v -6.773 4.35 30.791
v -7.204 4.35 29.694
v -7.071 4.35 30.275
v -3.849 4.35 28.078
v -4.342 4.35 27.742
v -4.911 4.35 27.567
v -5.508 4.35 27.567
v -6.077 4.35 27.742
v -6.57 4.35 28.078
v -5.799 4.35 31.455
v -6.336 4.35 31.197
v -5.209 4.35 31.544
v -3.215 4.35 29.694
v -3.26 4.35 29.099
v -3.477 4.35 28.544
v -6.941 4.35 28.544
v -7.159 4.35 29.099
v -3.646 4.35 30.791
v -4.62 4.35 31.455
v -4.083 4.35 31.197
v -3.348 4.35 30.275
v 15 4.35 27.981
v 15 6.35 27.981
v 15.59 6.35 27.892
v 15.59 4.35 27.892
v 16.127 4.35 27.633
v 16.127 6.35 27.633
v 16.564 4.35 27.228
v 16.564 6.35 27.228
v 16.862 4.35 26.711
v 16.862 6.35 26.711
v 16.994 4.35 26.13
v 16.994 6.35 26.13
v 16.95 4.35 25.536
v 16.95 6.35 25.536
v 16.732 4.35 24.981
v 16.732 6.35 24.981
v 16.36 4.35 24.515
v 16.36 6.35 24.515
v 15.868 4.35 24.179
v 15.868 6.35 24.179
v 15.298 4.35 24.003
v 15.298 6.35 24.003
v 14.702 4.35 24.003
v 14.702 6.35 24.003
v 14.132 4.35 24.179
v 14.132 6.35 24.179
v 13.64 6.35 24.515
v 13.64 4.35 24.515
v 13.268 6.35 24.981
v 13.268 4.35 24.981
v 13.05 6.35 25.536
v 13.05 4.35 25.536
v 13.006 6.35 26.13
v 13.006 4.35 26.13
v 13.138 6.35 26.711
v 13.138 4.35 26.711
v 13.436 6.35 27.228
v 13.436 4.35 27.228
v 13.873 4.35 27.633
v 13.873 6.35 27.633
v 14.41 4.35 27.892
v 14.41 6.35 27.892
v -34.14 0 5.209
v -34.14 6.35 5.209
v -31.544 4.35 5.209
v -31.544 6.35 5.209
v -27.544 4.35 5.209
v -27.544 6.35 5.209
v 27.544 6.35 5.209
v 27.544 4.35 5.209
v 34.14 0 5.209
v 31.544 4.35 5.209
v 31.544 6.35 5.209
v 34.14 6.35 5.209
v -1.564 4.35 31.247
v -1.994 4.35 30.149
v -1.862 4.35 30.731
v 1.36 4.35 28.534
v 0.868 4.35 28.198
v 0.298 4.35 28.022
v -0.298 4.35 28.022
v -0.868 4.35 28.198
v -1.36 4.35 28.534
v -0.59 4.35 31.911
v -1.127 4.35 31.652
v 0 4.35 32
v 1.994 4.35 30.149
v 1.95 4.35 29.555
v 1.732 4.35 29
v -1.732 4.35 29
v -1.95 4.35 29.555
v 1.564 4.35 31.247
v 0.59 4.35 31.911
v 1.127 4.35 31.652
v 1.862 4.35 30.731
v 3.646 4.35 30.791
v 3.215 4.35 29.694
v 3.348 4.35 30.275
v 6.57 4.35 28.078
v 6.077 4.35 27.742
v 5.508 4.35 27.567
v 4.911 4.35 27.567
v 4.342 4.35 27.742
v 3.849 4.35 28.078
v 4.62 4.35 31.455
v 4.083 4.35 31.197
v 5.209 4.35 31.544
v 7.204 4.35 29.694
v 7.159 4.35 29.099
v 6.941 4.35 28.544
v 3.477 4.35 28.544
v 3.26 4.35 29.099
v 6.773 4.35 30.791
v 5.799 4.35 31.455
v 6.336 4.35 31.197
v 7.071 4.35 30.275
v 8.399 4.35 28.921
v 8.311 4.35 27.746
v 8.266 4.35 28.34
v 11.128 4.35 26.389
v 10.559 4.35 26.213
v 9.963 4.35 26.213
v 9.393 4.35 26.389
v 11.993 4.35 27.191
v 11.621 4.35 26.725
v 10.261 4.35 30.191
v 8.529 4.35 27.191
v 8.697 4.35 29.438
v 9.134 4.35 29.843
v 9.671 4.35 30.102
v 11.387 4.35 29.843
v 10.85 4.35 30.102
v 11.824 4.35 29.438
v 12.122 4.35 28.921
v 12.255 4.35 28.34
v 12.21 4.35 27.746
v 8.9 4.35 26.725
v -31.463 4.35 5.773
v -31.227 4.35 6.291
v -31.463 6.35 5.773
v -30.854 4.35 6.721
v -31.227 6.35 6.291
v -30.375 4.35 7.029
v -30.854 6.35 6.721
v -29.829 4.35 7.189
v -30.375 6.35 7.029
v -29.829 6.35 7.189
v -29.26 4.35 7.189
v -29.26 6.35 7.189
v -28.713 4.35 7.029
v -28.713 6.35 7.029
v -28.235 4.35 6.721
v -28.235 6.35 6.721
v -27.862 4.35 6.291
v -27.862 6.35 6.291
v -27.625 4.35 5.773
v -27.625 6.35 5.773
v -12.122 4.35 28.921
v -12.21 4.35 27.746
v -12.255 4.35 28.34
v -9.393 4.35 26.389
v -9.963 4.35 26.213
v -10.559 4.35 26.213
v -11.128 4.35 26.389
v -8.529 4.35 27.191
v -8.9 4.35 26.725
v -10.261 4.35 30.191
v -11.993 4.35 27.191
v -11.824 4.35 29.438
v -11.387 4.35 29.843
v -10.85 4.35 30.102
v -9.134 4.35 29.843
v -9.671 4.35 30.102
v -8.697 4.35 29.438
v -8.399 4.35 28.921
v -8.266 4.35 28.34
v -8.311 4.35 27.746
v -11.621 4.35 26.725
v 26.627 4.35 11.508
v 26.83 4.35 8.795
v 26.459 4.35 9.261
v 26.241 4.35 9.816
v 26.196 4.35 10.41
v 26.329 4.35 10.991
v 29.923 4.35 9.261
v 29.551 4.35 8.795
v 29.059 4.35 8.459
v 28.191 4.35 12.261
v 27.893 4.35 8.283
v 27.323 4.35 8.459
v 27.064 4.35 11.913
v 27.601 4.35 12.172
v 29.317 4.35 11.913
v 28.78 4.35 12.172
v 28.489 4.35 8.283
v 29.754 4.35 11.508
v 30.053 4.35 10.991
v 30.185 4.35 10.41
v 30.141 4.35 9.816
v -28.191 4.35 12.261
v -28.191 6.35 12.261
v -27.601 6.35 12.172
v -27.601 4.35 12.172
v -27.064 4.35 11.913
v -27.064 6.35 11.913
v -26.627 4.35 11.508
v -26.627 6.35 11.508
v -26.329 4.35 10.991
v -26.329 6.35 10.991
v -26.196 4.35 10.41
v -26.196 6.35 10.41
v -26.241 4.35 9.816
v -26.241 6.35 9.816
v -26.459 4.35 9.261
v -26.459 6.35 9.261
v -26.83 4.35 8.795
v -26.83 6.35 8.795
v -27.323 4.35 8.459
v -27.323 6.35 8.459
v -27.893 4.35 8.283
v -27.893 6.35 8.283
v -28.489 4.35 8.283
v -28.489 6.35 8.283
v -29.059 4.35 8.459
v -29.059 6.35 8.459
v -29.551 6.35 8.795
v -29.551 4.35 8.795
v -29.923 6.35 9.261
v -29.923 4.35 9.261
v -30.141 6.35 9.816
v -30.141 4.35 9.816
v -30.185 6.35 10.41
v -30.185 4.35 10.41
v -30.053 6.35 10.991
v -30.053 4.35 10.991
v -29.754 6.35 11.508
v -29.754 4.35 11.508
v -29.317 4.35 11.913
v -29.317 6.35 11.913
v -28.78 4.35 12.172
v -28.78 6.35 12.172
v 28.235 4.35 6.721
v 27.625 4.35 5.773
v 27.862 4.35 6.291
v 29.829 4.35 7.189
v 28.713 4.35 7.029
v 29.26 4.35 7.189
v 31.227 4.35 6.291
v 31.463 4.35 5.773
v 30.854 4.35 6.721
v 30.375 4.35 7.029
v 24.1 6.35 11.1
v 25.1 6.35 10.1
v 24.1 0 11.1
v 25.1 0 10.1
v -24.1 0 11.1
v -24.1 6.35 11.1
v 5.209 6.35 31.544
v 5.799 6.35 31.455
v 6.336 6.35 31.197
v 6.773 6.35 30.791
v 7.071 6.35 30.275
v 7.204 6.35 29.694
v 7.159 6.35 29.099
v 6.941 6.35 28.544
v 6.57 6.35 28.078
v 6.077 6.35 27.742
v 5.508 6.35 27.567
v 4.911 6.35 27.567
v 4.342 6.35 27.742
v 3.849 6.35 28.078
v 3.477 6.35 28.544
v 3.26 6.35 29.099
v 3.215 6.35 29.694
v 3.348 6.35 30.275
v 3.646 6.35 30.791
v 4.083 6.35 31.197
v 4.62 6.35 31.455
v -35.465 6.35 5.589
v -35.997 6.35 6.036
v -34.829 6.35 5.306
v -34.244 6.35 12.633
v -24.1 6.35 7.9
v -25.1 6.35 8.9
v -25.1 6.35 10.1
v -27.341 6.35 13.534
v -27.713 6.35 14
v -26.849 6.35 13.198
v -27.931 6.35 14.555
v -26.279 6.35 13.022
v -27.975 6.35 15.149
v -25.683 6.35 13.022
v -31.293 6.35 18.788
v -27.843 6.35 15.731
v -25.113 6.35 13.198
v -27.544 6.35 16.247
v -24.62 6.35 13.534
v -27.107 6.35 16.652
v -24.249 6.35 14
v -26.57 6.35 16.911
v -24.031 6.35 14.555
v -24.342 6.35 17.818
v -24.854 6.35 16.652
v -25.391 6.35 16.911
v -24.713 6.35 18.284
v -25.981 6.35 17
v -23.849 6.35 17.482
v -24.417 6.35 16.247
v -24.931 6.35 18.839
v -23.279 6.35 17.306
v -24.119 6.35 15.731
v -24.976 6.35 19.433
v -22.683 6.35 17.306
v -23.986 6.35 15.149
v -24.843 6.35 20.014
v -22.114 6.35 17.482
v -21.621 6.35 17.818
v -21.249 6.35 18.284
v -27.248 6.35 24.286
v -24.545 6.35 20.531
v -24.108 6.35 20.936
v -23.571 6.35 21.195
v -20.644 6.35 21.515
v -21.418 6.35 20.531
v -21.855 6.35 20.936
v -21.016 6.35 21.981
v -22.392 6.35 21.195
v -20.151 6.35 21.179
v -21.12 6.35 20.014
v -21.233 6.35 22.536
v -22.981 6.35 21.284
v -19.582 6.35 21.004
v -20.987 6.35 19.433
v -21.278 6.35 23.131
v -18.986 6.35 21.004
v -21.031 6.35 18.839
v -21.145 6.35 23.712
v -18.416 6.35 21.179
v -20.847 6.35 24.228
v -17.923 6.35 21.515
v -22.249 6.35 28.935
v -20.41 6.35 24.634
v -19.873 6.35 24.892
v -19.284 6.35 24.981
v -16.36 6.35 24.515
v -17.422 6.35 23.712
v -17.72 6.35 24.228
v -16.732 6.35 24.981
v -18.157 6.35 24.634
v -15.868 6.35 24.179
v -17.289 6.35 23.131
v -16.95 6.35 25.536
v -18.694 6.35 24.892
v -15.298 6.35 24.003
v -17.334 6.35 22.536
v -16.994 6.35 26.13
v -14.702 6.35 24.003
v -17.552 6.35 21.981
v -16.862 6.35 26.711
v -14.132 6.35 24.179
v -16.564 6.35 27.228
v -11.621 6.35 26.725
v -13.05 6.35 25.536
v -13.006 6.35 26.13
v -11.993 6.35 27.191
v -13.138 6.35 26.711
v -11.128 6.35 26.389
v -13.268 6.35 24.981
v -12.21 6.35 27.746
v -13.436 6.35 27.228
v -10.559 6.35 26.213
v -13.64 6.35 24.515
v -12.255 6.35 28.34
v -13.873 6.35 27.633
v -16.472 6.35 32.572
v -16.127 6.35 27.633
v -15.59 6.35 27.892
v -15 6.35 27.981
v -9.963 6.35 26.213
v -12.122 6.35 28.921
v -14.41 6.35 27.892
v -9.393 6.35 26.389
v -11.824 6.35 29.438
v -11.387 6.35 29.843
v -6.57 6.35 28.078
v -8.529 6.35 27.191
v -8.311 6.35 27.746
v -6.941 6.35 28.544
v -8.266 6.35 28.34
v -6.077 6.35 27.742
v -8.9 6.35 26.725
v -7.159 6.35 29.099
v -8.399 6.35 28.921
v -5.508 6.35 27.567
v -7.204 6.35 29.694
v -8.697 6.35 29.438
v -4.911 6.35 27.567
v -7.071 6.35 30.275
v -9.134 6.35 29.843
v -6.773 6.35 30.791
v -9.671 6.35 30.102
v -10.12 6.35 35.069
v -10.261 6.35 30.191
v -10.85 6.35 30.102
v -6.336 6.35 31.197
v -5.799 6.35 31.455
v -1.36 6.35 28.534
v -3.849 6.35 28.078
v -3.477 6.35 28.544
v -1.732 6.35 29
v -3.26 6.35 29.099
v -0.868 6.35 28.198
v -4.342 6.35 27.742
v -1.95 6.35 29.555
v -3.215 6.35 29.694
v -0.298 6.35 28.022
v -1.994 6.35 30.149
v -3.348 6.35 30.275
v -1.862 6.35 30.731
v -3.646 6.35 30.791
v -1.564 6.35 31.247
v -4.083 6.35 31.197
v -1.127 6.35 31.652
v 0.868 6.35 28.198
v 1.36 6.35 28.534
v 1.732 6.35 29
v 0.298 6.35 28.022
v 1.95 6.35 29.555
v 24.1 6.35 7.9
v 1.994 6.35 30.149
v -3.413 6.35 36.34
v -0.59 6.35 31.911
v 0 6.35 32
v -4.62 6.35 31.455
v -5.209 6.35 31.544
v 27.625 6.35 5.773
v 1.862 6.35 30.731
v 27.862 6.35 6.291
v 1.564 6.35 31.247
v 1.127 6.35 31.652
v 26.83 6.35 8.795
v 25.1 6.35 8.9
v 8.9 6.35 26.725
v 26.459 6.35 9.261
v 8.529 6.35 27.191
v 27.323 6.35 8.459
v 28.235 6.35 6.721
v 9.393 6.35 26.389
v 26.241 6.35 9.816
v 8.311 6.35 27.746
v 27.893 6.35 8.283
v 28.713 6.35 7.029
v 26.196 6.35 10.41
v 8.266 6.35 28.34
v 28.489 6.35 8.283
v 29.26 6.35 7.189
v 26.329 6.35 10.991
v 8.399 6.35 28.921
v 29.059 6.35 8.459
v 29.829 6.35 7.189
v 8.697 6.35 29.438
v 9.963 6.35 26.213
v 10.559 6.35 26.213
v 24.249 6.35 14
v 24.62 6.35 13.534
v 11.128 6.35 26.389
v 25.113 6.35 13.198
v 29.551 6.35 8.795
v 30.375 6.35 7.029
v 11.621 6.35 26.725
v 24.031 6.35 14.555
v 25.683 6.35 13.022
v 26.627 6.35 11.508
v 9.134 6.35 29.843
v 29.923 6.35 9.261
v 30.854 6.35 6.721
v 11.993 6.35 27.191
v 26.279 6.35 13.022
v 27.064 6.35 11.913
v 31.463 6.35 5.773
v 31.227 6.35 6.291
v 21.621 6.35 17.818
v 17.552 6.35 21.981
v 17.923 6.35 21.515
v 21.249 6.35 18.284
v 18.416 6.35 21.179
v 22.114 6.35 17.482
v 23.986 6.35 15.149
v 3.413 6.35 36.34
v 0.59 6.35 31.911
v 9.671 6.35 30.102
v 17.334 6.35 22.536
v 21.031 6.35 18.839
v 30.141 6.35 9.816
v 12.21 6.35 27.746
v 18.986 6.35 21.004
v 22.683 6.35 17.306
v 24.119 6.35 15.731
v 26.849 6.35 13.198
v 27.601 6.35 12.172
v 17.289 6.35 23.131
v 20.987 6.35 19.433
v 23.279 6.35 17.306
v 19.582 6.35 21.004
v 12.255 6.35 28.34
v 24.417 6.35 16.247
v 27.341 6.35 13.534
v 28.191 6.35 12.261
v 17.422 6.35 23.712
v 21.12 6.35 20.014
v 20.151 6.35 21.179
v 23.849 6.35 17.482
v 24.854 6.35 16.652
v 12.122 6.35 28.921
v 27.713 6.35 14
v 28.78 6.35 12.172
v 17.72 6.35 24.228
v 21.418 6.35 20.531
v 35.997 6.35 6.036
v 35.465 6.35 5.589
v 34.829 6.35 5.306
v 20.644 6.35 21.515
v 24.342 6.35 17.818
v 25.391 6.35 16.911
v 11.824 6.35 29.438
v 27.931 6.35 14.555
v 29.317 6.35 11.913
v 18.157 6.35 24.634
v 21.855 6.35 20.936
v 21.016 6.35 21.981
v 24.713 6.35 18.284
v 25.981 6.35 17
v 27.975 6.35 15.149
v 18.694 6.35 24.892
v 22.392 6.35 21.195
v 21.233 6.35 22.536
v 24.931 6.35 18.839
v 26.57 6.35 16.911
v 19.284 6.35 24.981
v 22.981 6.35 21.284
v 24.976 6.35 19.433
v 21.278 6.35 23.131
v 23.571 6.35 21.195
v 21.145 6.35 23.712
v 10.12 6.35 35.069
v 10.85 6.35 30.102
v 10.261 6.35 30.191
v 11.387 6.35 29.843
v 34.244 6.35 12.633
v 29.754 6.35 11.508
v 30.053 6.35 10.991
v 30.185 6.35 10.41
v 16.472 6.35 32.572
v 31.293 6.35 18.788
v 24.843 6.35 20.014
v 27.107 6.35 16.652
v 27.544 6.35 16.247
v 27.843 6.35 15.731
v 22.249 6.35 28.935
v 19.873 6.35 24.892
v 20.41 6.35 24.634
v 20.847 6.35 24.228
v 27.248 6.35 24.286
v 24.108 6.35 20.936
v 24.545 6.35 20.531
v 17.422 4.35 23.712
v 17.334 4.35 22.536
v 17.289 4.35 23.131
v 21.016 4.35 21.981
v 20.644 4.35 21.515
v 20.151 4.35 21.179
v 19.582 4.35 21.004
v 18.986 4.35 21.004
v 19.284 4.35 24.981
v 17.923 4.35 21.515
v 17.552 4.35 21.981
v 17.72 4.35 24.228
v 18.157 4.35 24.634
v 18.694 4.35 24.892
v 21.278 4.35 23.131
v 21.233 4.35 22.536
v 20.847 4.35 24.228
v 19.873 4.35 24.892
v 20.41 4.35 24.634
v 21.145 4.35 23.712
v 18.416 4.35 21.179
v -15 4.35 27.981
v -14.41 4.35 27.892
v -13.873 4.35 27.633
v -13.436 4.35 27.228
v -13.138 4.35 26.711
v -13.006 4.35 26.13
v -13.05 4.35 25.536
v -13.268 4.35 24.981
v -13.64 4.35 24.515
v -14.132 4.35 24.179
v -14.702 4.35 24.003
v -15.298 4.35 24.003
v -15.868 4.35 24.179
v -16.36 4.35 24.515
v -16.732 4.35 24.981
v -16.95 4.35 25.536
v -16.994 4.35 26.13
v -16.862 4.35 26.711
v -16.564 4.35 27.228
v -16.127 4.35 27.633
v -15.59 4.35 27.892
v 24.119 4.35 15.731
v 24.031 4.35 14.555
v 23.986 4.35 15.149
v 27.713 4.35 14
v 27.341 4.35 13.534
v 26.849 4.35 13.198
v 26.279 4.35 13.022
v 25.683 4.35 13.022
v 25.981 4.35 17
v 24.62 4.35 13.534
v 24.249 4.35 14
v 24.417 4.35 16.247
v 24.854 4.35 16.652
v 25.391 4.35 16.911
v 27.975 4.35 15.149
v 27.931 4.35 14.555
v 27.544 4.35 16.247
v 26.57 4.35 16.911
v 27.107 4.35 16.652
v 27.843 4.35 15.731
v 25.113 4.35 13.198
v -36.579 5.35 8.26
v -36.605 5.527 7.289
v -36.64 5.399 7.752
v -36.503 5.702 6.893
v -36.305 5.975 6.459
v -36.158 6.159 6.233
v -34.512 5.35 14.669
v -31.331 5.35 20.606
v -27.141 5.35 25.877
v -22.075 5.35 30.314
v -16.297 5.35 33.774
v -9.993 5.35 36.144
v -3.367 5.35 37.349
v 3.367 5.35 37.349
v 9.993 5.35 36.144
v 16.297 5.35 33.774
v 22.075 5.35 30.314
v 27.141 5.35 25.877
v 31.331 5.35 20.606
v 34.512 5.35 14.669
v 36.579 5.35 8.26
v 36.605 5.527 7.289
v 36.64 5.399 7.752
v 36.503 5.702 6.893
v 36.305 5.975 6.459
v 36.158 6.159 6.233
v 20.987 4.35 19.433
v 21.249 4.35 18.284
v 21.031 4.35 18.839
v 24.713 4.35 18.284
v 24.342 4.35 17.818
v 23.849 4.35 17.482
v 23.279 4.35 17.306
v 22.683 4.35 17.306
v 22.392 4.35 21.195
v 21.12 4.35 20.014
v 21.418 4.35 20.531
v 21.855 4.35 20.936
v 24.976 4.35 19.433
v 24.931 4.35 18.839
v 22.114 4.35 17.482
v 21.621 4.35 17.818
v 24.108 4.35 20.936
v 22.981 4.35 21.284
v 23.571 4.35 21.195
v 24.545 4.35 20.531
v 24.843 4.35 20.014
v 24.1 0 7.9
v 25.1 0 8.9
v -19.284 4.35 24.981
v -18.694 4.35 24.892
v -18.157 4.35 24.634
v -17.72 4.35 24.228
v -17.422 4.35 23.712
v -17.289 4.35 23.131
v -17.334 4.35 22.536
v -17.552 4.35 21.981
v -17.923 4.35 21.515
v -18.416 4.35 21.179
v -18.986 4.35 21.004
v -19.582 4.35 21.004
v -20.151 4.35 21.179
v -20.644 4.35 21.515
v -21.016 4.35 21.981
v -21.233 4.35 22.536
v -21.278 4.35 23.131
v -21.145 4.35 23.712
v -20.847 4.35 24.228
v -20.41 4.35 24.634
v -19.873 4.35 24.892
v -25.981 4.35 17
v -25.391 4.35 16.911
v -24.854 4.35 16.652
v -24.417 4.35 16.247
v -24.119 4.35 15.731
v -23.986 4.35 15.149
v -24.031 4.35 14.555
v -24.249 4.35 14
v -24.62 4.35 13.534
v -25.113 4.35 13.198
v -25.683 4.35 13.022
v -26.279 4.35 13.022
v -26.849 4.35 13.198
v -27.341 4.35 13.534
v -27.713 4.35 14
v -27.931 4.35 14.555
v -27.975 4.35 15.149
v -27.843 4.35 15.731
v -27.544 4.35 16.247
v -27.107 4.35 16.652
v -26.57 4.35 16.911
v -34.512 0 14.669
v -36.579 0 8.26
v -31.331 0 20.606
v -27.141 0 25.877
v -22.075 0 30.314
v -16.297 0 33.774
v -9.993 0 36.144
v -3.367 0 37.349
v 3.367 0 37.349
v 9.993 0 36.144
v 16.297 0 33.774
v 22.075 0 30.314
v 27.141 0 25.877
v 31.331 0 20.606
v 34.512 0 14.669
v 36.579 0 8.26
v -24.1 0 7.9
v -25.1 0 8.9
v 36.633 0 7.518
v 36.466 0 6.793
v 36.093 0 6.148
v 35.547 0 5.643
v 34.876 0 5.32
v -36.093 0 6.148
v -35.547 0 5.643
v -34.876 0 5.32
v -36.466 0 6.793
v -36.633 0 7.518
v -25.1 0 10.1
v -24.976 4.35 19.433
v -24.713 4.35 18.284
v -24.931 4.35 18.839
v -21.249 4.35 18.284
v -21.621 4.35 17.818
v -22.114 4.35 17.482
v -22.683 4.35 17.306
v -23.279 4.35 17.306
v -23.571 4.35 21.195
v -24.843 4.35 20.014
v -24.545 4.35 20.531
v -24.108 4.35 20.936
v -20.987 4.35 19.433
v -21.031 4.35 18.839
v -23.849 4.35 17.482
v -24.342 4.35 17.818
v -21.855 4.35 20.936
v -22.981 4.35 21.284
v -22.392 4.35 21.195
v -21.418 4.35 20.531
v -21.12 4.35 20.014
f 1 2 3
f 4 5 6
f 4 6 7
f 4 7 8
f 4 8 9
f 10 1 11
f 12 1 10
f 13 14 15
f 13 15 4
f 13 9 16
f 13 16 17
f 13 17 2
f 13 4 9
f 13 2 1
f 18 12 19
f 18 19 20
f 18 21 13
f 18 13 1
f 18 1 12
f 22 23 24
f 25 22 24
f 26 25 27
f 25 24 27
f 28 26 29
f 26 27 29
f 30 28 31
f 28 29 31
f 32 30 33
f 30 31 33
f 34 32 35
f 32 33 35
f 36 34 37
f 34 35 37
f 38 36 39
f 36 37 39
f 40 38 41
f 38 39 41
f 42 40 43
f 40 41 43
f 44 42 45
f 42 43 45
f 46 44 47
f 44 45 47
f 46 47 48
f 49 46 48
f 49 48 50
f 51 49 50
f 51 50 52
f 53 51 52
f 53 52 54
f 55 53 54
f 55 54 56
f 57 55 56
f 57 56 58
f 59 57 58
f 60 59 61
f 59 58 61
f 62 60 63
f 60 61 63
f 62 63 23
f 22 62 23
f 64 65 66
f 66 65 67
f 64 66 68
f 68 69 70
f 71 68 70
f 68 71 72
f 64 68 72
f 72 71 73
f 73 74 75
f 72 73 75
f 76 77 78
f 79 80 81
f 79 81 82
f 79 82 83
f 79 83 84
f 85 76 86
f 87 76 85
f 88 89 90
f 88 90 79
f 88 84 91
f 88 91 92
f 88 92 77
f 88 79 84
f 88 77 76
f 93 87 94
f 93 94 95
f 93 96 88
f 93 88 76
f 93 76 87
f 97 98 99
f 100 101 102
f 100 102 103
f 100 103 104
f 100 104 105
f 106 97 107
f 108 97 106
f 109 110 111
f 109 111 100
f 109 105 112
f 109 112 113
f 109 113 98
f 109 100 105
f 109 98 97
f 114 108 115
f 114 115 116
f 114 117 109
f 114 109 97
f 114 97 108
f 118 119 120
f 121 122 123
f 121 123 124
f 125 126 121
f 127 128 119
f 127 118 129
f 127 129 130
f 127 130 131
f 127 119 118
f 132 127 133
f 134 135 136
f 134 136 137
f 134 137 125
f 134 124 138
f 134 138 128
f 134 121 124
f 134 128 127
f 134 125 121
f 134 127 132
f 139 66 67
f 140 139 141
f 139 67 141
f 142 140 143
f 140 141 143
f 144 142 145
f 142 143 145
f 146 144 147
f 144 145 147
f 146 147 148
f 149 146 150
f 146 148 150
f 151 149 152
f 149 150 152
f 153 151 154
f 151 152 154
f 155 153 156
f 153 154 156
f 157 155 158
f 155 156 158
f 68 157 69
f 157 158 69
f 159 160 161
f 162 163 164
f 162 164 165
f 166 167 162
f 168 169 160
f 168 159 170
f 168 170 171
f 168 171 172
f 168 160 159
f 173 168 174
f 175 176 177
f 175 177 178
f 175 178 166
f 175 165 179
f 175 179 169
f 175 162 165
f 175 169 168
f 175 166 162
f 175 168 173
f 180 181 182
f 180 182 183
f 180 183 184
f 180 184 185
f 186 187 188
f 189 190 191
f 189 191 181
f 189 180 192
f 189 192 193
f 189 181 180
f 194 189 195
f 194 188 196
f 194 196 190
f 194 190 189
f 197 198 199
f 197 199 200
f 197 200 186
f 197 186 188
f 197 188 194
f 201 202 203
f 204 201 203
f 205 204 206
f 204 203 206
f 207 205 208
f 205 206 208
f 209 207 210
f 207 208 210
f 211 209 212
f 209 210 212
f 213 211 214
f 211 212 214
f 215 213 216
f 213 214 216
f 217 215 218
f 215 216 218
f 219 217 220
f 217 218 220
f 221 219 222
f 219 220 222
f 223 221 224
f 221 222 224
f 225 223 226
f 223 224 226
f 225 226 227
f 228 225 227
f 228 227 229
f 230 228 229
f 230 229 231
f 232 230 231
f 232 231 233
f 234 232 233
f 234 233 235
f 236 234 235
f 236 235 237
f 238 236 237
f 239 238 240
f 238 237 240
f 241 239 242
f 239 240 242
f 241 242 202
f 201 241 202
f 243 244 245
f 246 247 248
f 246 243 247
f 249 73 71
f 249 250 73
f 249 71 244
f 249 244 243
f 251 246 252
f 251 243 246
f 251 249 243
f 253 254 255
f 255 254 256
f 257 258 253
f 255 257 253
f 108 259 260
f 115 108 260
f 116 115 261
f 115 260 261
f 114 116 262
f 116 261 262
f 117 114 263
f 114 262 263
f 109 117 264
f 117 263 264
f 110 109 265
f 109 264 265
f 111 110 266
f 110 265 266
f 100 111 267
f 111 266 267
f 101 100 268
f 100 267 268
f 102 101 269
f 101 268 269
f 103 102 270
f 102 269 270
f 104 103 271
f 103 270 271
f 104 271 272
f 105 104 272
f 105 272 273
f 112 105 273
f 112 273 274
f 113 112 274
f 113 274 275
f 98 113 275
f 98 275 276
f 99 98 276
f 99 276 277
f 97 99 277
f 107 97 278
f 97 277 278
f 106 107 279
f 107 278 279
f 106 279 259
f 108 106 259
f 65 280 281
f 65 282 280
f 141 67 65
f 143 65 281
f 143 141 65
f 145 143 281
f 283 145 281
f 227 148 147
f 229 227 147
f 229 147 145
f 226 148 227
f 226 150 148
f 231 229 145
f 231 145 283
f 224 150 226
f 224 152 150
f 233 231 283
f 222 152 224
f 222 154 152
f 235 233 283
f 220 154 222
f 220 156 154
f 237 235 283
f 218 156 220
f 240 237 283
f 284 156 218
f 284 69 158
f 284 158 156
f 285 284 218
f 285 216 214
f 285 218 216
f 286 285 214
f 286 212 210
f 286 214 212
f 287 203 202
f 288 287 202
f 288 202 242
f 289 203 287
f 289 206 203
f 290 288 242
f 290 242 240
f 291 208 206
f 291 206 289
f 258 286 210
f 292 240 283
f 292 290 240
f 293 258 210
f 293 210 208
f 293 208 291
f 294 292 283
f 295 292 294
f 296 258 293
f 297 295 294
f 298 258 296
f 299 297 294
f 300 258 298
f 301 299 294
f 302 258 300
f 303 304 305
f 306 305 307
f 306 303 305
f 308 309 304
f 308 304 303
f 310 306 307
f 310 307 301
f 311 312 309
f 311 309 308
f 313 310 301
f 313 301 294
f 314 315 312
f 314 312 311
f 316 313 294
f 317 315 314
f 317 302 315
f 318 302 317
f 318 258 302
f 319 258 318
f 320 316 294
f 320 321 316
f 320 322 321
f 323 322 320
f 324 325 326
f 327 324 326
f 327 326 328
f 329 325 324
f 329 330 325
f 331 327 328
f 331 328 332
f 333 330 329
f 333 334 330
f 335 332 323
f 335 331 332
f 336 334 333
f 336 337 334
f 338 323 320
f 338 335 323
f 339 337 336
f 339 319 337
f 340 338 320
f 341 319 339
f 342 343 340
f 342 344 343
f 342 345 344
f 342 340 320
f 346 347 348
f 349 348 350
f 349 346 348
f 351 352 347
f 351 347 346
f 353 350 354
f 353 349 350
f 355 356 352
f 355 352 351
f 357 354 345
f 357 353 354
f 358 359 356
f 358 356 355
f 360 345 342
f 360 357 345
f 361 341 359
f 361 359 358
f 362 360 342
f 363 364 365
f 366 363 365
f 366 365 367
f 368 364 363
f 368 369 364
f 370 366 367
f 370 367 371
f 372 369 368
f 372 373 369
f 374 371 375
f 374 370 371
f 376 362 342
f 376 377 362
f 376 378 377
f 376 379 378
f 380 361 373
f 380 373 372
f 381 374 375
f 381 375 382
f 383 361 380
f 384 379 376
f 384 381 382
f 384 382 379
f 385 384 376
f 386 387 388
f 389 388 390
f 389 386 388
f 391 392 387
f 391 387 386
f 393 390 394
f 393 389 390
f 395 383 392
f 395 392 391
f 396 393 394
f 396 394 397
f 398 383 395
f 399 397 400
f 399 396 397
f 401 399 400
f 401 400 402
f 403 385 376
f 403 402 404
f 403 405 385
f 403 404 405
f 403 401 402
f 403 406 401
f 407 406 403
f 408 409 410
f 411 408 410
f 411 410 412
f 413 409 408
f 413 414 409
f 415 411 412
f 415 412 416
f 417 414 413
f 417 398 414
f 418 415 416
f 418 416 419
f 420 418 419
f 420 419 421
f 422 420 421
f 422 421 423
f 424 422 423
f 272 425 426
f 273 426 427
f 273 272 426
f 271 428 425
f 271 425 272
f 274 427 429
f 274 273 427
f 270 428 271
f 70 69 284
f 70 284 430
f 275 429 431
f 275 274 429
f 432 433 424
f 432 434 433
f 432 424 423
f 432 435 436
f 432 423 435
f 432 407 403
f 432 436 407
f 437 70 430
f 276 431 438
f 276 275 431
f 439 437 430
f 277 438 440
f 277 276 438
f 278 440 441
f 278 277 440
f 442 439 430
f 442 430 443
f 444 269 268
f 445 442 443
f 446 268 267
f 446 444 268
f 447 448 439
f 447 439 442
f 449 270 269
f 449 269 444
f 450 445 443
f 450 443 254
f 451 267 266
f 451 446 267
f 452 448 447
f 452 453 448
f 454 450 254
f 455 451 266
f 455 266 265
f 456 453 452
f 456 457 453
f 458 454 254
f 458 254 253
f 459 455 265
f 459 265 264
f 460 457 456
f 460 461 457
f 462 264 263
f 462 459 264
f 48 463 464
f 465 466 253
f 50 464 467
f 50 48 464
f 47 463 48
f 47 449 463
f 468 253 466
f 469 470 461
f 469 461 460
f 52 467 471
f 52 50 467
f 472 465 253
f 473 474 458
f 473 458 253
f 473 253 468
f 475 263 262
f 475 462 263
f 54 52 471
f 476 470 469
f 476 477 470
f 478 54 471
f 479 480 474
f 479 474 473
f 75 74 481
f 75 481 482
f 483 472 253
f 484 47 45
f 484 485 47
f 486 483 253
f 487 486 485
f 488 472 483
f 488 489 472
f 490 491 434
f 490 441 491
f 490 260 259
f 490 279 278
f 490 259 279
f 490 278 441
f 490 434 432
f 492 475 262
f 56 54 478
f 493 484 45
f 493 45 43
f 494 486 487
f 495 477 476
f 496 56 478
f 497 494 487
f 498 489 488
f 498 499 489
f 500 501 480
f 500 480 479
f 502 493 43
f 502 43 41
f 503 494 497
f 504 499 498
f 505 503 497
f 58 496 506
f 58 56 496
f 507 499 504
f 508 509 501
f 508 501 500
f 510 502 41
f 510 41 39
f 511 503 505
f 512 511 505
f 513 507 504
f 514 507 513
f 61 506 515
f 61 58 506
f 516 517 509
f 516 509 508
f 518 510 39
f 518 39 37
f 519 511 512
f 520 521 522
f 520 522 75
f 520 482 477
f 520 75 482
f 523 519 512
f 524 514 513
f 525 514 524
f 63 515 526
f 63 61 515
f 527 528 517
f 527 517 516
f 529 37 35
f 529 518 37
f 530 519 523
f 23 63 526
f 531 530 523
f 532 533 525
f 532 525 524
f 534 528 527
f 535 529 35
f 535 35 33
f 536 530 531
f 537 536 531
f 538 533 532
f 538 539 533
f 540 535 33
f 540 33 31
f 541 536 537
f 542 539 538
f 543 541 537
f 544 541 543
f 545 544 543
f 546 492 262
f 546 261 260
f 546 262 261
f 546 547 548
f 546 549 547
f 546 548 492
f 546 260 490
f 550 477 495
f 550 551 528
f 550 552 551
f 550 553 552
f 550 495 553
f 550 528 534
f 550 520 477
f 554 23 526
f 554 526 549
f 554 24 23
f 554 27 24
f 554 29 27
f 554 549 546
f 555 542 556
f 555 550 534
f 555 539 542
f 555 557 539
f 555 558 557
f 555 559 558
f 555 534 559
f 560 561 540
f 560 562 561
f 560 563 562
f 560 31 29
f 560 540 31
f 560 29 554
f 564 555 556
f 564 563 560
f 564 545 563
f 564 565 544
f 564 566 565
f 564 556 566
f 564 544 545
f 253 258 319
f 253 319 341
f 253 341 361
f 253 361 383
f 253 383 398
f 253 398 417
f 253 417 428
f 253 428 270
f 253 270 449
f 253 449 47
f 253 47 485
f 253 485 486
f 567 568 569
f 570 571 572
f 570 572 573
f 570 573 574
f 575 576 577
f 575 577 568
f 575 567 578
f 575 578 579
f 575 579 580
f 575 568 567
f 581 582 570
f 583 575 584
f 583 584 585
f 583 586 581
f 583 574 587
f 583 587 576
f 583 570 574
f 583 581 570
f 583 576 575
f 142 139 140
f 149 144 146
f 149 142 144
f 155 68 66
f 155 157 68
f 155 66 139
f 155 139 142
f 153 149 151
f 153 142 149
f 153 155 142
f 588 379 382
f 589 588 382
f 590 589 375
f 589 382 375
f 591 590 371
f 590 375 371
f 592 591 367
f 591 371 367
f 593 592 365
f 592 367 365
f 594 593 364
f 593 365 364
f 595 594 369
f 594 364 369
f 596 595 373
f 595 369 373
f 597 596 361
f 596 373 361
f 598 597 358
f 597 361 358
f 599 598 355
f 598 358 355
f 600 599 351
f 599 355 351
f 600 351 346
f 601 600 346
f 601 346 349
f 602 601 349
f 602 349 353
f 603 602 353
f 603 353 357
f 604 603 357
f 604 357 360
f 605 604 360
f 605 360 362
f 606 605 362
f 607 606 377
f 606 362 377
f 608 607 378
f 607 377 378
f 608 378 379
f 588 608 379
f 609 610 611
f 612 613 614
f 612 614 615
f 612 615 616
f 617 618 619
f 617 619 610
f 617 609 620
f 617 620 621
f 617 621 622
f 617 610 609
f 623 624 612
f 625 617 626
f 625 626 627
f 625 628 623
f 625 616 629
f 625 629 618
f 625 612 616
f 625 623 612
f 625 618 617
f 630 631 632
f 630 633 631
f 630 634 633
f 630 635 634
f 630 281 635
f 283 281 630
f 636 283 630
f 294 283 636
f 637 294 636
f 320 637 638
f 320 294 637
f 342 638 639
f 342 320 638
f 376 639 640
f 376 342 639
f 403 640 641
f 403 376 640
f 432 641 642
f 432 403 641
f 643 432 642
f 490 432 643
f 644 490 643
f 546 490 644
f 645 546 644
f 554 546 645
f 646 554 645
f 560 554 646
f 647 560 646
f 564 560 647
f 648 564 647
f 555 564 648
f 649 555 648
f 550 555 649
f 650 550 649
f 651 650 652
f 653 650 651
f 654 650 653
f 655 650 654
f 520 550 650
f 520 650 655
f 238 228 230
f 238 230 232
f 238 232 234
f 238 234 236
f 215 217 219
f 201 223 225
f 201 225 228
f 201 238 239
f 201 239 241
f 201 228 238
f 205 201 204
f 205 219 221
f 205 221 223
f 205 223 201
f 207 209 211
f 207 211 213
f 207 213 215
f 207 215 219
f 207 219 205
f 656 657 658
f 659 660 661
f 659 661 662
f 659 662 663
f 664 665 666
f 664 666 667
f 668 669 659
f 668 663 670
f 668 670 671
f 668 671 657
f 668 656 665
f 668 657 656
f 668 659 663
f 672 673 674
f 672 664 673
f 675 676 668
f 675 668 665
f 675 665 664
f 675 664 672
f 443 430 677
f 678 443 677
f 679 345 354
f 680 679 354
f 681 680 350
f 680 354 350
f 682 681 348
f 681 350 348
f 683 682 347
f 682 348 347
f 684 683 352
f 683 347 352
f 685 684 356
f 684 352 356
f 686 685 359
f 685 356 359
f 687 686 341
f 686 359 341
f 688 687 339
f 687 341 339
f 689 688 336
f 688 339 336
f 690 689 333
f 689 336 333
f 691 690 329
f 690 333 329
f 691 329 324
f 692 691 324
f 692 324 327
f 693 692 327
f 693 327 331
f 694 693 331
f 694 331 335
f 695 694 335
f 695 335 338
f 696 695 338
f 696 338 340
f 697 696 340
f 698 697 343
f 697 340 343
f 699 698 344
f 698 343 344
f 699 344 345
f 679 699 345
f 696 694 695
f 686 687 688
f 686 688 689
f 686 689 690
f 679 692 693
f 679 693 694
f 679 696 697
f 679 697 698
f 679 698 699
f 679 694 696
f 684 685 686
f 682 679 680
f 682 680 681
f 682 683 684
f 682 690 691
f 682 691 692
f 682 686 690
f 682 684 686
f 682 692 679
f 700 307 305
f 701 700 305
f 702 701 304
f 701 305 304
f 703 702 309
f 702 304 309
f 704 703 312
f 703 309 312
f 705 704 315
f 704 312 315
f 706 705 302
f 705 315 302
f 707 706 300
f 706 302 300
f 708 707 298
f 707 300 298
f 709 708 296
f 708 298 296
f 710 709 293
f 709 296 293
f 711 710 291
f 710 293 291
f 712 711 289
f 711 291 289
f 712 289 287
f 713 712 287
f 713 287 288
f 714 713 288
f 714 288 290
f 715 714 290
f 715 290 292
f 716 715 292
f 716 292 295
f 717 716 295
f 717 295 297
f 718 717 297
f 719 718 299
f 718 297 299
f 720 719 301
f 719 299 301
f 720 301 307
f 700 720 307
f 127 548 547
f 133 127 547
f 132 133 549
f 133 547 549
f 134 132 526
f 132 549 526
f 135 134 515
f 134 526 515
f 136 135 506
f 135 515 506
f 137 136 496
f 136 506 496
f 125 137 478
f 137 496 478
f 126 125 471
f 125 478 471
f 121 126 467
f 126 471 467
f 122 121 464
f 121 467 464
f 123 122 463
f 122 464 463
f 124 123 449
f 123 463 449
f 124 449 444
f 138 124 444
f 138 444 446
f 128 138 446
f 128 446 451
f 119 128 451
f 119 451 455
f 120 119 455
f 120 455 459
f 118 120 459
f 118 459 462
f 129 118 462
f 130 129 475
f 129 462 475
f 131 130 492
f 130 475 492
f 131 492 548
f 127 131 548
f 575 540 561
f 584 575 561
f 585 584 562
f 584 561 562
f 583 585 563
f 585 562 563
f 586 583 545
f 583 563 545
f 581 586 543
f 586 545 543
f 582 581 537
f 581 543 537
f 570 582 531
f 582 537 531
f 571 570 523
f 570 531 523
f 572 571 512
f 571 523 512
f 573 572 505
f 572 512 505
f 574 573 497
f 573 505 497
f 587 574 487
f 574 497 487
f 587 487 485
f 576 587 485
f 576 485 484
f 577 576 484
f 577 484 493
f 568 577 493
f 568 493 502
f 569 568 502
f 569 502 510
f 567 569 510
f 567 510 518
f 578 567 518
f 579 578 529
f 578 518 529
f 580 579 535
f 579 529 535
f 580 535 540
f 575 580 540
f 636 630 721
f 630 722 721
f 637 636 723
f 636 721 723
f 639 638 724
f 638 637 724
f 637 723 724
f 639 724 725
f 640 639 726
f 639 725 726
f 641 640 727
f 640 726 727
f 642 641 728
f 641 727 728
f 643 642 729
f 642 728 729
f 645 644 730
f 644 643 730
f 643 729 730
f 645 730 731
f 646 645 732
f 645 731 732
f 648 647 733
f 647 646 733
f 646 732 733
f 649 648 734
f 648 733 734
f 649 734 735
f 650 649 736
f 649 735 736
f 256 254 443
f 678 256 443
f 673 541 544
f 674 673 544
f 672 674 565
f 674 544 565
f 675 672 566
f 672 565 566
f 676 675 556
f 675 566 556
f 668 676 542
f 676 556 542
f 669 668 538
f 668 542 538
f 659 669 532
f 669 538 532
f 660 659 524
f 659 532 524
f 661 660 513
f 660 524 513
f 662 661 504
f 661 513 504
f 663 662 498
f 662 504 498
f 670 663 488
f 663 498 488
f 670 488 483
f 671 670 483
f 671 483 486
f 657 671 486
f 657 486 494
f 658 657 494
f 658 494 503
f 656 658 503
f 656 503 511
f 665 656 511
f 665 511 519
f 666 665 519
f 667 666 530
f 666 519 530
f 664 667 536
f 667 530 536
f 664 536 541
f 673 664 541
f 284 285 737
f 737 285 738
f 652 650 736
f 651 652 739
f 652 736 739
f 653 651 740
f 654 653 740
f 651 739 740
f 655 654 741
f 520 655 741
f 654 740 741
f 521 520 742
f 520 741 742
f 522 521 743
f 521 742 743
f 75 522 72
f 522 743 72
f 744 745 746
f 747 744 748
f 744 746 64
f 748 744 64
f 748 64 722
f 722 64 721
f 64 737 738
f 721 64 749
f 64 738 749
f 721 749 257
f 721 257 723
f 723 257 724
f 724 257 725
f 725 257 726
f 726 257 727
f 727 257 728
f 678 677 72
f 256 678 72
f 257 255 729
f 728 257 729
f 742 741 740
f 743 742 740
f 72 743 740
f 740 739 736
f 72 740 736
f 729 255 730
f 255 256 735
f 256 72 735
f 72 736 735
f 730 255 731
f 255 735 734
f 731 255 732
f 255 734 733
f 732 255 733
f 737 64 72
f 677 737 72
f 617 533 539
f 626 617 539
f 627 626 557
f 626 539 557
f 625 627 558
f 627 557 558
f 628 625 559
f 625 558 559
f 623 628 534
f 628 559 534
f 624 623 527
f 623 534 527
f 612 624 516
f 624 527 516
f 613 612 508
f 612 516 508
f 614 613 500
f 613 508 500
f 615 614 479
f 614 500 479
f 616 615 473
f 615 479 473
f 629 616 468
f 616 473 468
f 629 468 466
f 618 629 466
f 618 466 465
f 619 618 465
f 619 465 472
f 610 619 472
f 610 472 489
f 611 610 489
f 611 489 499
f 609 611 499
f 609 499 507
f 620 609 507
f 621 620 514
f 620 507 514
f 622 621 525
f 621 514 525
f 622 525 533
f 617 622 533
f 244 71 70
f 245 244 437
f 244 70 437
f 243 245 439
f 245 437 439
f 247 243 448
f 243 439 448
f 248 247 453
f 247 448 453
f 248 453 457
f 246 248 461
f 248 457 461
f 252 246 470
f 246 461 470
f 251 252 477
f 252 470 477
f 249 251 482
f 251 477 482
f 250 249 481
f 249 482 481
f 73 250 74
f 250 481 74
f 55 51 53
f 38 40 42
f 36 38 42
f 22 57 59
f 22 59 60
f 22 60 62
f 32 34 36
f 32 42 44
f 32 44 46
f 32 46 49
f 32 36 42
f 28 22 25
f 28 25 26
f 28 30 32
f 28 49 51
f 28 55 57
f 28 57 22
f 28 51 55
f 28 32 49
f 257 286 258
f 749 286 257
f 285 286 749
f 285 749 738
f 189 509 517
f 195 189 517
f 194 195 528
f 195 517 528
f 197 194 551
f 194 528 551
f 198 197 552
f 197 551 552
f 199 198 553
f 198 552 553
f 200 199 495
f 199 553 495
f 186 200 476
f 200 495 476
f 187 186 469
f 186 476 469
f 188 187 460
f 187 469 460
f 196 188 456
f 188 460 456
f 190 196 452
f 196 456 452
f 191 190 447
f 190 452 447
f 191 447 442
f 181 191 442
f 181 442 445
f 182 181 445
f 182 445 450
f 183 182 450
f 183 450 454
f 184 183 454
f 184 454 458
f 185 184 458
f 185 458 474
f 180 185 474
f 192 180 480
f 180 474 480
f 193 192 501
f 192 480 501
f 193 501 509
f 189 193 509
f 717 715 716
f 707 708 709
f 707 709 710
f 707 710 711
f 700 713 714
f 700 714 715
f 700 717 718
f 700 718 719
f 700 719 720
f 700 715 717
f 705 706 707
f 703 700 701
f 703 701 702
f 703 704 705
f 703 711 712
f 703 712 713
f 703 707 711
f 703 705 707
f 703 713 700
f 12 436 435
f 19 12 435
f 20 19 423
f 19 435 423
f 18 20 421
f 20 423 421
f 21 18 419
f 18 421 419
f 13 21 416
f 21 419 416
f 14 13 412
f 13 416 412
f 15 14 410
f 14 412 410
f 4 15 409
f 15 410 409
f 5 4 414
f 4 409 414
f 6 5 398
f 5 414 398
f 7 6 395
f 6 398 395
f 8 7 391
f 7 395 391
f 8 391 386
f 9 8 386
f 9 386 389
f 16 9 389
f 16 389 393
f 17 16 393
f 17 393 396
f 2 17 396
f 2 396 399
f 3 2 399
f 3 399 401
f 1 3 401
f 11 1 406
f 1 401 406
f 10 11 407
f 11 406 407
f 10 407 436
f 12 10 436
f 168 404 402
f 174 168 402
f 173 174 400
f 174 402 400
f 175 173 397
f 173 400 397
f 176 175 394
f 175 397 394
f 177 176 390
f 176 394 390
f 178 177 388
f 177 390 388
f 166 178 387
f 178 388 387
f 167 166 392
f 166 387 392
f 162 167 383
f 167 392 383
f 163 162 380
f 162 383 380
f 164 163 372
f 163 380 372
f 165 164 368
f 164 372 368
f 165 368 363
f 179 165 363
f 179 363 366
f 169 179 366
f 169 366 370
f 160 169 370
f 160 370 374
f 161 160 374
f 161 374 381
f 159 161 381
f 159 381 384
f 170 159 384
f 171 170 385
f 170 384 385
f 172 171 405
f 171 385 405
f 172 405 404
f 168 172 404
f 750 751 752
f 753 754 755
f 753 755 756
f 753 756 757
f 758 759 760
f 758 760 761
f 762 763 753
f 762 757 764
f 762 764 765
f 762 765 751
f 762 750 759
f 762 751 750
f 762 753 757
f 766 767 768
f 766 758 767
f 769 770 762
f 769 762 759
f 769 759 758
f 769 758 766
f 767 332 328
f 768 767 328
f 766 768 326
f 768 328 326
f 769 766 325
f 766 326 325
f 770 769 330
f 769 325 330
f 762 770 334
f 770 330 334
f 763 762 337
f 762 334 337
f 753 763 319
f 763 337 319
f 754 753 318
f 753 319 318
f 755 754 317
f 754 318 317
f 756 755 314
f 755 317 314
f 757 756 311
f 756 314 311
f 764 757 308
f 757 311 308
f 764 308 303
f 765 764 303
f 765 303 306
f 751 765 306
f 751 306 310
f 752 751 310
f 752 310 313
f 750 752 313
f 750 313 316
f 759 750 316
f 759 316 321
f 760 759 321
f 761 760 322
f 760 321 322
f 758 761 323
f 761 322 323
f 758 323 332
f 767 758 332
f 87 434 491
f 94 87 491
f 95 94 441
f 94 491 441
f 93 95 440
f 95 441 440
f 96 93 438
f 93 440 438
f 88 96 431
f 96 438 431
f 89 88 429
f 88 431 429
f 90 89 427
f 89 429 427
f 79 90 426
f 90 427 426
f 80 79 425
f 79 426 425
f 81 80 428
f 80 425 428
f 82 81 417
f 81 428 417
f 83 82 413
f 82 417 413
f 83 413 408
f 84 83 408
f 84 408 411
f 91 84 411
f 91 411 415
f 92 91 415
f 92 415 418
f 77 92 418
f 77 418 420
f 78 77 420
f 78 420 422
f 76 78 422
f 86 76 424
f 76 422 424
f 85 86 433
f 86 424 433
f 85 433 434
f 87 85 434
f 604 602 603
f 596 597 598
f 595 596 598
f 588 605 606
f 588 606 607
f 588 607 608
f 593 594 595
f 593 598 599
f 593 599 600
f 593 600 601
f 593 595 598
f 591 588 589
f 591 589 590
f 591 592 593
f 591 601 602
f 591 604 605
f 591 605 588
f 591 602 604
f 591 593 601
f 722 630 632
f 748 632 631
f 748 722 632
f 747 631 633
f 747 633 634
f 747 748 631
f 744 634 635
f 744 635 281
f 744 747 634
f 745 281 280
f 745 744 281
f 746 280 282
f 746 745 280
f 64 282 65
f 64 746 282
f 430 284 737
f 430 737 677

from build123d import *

# Parameters (mm, degrees)
SKETCH1_R                 = 37.5
BOSS_EXTRUDE1_DEPTH       = 6.35
SKETCH2_R                 = 2
CUT_EXTRUDE1_DEPTH        = 2
M6X1_0_TAPPED_HOLE1_D     = 5
M6X1_0_TAPPED_HOLE1_DEPTH = 15
M6X1_0_TAPPED_HOLE1_TIP   = 1.502151548
CHAMFER1_SIZE             = 1
SKETCH6_W                 = 50.2
SKETCH6_H                 = 3.2
CUT_EXTRUDE2_DEPTH        = 10
CHAMFER2_SIZE             = 1
CUT_EXTRUDE3_DEPTH        = 18
FILLET1_R                 = 2.5


with BuildPart() as part:
    # Sketch1 → Boss-Extrude1 (new body)
    with BuildSketch(Plane(origin=(0, 0, 0), x_dir=(1, 0, 0), z_dir=(0, 1, 0))):
        with Locations(Location((0, 0, 0), (0, 0, 270))):
            Circle(SKETCH1_R)
    extrude(amount=BOSS_EXTRUDE1_DEPTH)

    # Sketch2 → Cut-Extrude1 (cut)
    with BuildSketch(Plane(origin=(0, 6.35, 0), x_dir=(1, 0, 0), z_dir=(0, 1, 0))):
        with Locations(Location((0, 30, 0), (0, 0, 270))):
            Circle(SKETCH2_R)
        with Locations(Location((5.20944533, 29.54423259, 0), (0, 0, 270))):
            Circle(SKETCH2_R)
        with Locations(Location((10.2606043, 28.190778624, 0), (0, 0, 270))):
            Circle(SKETCH2_R)
        with Locations(Location((15, 25.980762114, 0), (0, 0, 270))):
            Circle(SKETCH2_R)
        with Locations(Location((19.283628291, 22.981333294, 0), (0, 0, 270))):
            Circle(SKETCH2_R)
        with Locations(Location((22.981333294, 19.283628291, 0), (0, 0, 270))):
            Circle(SKETCH2_R)
        with Locations(Location((25.980762114, 15, 0), (0, 0, 270))):
            Circle(SKETCH2_R)
        with Locations(Location((28.190778624, 10.2606043, 0), (0, 0, 270))):
            Circle(SKETCH2_R)
        with Locations(Location((29.54423259, 5.20944533, 0), (0, 0, 270))):
            Circle(SKETCH2_R)
        with Locations(Location((30, 0, 0), (0, 0, 270))):
            Circle(SKETCH2_R)
        with Locations(Location((29.54423259, -5.20944533, 0), (0, 0, 270))):
            Circle(SKETCH2_R)
        with Locations(Location((28.190778624, -10.2606043, 0), (0, 0, 270))):
            Circle(SKETCH2_R)
        with Locations(Location((25.980762114, -15, 0), (0, 0, 270))):
            Circle(SKETCH2_R)
        with Locations(Location((22.981333294, -19.283628291, 0), (0, 0, 270))):
            Circle(SKETCH2_R)
        with Locations(Location((19.283628291, -22.981333294, 0), (0, 0, 270))):
            Circle(SKETCH2_R)
        with Locations(Location((15, -25.980762114, 0), (0, 0, 270))):
            Circle(SKETCH2_R)
        with Locations(Location((10.2606043, -28.190778624, 0), (0, 0, 270))):
            Circle(SKETCH2_R)
        with Locations(Location((5.20944533, -29.54423259, 0), (0, 0, 270))):
            Circle(SKETCH2_R)
        with Locations(Location((0, -30, 0), (0, 0, 270))):
            Circle(SKETCH2_R)
        with Locations(Location((-5.20944533, -29.54423259, 0), (0, 0, 270))):
            Circle(SKETCH2_R)
        with Locations(Location((-10.2606043, -28.190778624, 0), (0, 0, 270))):
            Circle(SKETCH2_R)
        with Locations(Location((-15, -25.980762114, 0), (0, 0, 270))):
            Circle(SKETCH2_R)
        with Locations(Location((-19.283628291, -22.981333294, 0), (0, 0, 270))):
            Circle(SKETCH2_R)
        with Locations(Location((-22.981333294, -19.283628291, 0), (0, 0, 270))):
            Circle(SKETCH2_R)
        with Locations(Location((-25.980762114, -15, 0), (0, 0, 270))):
            Circle(SKETCH2_R)
        with Locations(Location((-28.190778624, -10.2606043, 0), (0, 0, 270))):
            Circle(SKETCH2_R)
        with Locations(Location((-29.54423259, -5.20944533, 0), (0, 0, 270))):
            Circle(SKETCH2_R)
        with Locations(Location((-30, 0, 0), (0, 0, 270))):
            Circle(SKETCH2_R)
        with Locations(Location((-29.54423259, 5.20944533, 0), (0, 0, 270))):
            Circle(SKETCH2_R)
        with Locations(Location((-28.190778624, 10.2606043, 0), (0, 0, 270))):
            Circle(SKETCH2_R)
        with Locations(Location((-25.980762114, 15, 0), (0, 0, 270))):
            Circle(SKETCH2_R)
        with Locations(Location((-22.981333294, 19.283628291, 0), (0, 0, 270))):
            Circle(SKETCH2_R)
        with Locations(Location((-19.283628291, 22.981333294, 0), (0, 0, 270))):
            Circle(SKETCH2_R)
        with Locations(Location((-15, 25.980762114, 0), (0, 0, 270))):
            Circle(SKETCH2_R)
        with Locations(Location((-10.2606043, 28.190778624, 0), (0, 0, 270))):
            Circle(SKETCH2_R)
        with Locations(Location((-5.20944533, 29.54423259, 0), (0, 0, 270))):
            Circle(SKETCH2_R)
    extrude(amount=-CUT_EXTRUDE1_DEPTH, mode=Mode.SUBTRACT)

    # M6x1.0 Tapped Hole1
    with Locations(Plane(origin=(0, 6.35, 0), x_dir=(1, 0, 0), z_dir=(0, 1, 0))):
        with Locations((0, 0)):
            Hole(M6X1_0_TAPPED_HOLE1_D / 2, depth=M6X1_0_TAPPED_HOLE1_DEPTH)
            with Locations((0, 0, -(M6X1_0_TAPPED_HOLE1_DEPTH + M6X1_0_TAPPED_HOLE1_TIP / 2))):  # 118° drill point
                Cone(0, M6X1_0_TAPPED_HOLE1_D / 2, M6X1_0_TAPPED_HOLE1_TIP, mode=Mode.SUBTRACT)

    # Chamfer1
    chamfer1_edges = [part.edges().sort_by_distance(p)[0] for p in [
        (0, 6.35, -37.5),
    ]]
    chamfer(chamfer1_edges, length=CHAMFER1_SIZE)

    # Sketch6 → Cut-Extrude2 (cut)
    with BuildSketch(Plane(origin=(0, 6.35, 0), x_dir=(1, 0, 0), z_dir=(0, 1, 0))):
        with Locations((0, -9.5)):
            Rectangle(SKETCH6_W, SKETCH6_H)
    extrude(amount=-CUT_EXTRUDE2_DEPTH, mode=Mode.SUBTRACT)

    # Chamfer2
    chamfer2_edges = [part.edges().sort_by_distance(p)[0] for p in [
        (25.1, 3.175, 7.9),
        (25.1, 3.175, 11.1),
        (-25.1, 3.175, 11.1),
        (-25.1, 3.175, 7.9),
    ]]
    chamfer(chamfer2_edges, length=CHAMFER2_SIZE)

    # Sketch7 → Cut-Extrude3 (cut)
    with BuildSketch(Plane(origin=(0, 6.35, 0), x_dir=(1, 0, 0), z_dir=(0, 1, 0))):
        Polygon((-45.405269777, -5.20944533), (48.202750853, -5.20944533), (48.202750853, 45.076127107), (-45.405269777, 43.569791143), align=None)
    extrude(amount=-CUT_EXTRUDE3_DEPTH, mode=Mode.SUBTRACT)

    # Fillet1
    fillet1_edges = [part.edges().sort_by_distance(p)[0] for p in [
        (37.136392923, 2.675, 5.20944533),
        (-37.136392923, 2.675, 5.20944533),
    ]]
    fillet(fillet1_edges, radius=FILLET1_R)


solid = part.part
